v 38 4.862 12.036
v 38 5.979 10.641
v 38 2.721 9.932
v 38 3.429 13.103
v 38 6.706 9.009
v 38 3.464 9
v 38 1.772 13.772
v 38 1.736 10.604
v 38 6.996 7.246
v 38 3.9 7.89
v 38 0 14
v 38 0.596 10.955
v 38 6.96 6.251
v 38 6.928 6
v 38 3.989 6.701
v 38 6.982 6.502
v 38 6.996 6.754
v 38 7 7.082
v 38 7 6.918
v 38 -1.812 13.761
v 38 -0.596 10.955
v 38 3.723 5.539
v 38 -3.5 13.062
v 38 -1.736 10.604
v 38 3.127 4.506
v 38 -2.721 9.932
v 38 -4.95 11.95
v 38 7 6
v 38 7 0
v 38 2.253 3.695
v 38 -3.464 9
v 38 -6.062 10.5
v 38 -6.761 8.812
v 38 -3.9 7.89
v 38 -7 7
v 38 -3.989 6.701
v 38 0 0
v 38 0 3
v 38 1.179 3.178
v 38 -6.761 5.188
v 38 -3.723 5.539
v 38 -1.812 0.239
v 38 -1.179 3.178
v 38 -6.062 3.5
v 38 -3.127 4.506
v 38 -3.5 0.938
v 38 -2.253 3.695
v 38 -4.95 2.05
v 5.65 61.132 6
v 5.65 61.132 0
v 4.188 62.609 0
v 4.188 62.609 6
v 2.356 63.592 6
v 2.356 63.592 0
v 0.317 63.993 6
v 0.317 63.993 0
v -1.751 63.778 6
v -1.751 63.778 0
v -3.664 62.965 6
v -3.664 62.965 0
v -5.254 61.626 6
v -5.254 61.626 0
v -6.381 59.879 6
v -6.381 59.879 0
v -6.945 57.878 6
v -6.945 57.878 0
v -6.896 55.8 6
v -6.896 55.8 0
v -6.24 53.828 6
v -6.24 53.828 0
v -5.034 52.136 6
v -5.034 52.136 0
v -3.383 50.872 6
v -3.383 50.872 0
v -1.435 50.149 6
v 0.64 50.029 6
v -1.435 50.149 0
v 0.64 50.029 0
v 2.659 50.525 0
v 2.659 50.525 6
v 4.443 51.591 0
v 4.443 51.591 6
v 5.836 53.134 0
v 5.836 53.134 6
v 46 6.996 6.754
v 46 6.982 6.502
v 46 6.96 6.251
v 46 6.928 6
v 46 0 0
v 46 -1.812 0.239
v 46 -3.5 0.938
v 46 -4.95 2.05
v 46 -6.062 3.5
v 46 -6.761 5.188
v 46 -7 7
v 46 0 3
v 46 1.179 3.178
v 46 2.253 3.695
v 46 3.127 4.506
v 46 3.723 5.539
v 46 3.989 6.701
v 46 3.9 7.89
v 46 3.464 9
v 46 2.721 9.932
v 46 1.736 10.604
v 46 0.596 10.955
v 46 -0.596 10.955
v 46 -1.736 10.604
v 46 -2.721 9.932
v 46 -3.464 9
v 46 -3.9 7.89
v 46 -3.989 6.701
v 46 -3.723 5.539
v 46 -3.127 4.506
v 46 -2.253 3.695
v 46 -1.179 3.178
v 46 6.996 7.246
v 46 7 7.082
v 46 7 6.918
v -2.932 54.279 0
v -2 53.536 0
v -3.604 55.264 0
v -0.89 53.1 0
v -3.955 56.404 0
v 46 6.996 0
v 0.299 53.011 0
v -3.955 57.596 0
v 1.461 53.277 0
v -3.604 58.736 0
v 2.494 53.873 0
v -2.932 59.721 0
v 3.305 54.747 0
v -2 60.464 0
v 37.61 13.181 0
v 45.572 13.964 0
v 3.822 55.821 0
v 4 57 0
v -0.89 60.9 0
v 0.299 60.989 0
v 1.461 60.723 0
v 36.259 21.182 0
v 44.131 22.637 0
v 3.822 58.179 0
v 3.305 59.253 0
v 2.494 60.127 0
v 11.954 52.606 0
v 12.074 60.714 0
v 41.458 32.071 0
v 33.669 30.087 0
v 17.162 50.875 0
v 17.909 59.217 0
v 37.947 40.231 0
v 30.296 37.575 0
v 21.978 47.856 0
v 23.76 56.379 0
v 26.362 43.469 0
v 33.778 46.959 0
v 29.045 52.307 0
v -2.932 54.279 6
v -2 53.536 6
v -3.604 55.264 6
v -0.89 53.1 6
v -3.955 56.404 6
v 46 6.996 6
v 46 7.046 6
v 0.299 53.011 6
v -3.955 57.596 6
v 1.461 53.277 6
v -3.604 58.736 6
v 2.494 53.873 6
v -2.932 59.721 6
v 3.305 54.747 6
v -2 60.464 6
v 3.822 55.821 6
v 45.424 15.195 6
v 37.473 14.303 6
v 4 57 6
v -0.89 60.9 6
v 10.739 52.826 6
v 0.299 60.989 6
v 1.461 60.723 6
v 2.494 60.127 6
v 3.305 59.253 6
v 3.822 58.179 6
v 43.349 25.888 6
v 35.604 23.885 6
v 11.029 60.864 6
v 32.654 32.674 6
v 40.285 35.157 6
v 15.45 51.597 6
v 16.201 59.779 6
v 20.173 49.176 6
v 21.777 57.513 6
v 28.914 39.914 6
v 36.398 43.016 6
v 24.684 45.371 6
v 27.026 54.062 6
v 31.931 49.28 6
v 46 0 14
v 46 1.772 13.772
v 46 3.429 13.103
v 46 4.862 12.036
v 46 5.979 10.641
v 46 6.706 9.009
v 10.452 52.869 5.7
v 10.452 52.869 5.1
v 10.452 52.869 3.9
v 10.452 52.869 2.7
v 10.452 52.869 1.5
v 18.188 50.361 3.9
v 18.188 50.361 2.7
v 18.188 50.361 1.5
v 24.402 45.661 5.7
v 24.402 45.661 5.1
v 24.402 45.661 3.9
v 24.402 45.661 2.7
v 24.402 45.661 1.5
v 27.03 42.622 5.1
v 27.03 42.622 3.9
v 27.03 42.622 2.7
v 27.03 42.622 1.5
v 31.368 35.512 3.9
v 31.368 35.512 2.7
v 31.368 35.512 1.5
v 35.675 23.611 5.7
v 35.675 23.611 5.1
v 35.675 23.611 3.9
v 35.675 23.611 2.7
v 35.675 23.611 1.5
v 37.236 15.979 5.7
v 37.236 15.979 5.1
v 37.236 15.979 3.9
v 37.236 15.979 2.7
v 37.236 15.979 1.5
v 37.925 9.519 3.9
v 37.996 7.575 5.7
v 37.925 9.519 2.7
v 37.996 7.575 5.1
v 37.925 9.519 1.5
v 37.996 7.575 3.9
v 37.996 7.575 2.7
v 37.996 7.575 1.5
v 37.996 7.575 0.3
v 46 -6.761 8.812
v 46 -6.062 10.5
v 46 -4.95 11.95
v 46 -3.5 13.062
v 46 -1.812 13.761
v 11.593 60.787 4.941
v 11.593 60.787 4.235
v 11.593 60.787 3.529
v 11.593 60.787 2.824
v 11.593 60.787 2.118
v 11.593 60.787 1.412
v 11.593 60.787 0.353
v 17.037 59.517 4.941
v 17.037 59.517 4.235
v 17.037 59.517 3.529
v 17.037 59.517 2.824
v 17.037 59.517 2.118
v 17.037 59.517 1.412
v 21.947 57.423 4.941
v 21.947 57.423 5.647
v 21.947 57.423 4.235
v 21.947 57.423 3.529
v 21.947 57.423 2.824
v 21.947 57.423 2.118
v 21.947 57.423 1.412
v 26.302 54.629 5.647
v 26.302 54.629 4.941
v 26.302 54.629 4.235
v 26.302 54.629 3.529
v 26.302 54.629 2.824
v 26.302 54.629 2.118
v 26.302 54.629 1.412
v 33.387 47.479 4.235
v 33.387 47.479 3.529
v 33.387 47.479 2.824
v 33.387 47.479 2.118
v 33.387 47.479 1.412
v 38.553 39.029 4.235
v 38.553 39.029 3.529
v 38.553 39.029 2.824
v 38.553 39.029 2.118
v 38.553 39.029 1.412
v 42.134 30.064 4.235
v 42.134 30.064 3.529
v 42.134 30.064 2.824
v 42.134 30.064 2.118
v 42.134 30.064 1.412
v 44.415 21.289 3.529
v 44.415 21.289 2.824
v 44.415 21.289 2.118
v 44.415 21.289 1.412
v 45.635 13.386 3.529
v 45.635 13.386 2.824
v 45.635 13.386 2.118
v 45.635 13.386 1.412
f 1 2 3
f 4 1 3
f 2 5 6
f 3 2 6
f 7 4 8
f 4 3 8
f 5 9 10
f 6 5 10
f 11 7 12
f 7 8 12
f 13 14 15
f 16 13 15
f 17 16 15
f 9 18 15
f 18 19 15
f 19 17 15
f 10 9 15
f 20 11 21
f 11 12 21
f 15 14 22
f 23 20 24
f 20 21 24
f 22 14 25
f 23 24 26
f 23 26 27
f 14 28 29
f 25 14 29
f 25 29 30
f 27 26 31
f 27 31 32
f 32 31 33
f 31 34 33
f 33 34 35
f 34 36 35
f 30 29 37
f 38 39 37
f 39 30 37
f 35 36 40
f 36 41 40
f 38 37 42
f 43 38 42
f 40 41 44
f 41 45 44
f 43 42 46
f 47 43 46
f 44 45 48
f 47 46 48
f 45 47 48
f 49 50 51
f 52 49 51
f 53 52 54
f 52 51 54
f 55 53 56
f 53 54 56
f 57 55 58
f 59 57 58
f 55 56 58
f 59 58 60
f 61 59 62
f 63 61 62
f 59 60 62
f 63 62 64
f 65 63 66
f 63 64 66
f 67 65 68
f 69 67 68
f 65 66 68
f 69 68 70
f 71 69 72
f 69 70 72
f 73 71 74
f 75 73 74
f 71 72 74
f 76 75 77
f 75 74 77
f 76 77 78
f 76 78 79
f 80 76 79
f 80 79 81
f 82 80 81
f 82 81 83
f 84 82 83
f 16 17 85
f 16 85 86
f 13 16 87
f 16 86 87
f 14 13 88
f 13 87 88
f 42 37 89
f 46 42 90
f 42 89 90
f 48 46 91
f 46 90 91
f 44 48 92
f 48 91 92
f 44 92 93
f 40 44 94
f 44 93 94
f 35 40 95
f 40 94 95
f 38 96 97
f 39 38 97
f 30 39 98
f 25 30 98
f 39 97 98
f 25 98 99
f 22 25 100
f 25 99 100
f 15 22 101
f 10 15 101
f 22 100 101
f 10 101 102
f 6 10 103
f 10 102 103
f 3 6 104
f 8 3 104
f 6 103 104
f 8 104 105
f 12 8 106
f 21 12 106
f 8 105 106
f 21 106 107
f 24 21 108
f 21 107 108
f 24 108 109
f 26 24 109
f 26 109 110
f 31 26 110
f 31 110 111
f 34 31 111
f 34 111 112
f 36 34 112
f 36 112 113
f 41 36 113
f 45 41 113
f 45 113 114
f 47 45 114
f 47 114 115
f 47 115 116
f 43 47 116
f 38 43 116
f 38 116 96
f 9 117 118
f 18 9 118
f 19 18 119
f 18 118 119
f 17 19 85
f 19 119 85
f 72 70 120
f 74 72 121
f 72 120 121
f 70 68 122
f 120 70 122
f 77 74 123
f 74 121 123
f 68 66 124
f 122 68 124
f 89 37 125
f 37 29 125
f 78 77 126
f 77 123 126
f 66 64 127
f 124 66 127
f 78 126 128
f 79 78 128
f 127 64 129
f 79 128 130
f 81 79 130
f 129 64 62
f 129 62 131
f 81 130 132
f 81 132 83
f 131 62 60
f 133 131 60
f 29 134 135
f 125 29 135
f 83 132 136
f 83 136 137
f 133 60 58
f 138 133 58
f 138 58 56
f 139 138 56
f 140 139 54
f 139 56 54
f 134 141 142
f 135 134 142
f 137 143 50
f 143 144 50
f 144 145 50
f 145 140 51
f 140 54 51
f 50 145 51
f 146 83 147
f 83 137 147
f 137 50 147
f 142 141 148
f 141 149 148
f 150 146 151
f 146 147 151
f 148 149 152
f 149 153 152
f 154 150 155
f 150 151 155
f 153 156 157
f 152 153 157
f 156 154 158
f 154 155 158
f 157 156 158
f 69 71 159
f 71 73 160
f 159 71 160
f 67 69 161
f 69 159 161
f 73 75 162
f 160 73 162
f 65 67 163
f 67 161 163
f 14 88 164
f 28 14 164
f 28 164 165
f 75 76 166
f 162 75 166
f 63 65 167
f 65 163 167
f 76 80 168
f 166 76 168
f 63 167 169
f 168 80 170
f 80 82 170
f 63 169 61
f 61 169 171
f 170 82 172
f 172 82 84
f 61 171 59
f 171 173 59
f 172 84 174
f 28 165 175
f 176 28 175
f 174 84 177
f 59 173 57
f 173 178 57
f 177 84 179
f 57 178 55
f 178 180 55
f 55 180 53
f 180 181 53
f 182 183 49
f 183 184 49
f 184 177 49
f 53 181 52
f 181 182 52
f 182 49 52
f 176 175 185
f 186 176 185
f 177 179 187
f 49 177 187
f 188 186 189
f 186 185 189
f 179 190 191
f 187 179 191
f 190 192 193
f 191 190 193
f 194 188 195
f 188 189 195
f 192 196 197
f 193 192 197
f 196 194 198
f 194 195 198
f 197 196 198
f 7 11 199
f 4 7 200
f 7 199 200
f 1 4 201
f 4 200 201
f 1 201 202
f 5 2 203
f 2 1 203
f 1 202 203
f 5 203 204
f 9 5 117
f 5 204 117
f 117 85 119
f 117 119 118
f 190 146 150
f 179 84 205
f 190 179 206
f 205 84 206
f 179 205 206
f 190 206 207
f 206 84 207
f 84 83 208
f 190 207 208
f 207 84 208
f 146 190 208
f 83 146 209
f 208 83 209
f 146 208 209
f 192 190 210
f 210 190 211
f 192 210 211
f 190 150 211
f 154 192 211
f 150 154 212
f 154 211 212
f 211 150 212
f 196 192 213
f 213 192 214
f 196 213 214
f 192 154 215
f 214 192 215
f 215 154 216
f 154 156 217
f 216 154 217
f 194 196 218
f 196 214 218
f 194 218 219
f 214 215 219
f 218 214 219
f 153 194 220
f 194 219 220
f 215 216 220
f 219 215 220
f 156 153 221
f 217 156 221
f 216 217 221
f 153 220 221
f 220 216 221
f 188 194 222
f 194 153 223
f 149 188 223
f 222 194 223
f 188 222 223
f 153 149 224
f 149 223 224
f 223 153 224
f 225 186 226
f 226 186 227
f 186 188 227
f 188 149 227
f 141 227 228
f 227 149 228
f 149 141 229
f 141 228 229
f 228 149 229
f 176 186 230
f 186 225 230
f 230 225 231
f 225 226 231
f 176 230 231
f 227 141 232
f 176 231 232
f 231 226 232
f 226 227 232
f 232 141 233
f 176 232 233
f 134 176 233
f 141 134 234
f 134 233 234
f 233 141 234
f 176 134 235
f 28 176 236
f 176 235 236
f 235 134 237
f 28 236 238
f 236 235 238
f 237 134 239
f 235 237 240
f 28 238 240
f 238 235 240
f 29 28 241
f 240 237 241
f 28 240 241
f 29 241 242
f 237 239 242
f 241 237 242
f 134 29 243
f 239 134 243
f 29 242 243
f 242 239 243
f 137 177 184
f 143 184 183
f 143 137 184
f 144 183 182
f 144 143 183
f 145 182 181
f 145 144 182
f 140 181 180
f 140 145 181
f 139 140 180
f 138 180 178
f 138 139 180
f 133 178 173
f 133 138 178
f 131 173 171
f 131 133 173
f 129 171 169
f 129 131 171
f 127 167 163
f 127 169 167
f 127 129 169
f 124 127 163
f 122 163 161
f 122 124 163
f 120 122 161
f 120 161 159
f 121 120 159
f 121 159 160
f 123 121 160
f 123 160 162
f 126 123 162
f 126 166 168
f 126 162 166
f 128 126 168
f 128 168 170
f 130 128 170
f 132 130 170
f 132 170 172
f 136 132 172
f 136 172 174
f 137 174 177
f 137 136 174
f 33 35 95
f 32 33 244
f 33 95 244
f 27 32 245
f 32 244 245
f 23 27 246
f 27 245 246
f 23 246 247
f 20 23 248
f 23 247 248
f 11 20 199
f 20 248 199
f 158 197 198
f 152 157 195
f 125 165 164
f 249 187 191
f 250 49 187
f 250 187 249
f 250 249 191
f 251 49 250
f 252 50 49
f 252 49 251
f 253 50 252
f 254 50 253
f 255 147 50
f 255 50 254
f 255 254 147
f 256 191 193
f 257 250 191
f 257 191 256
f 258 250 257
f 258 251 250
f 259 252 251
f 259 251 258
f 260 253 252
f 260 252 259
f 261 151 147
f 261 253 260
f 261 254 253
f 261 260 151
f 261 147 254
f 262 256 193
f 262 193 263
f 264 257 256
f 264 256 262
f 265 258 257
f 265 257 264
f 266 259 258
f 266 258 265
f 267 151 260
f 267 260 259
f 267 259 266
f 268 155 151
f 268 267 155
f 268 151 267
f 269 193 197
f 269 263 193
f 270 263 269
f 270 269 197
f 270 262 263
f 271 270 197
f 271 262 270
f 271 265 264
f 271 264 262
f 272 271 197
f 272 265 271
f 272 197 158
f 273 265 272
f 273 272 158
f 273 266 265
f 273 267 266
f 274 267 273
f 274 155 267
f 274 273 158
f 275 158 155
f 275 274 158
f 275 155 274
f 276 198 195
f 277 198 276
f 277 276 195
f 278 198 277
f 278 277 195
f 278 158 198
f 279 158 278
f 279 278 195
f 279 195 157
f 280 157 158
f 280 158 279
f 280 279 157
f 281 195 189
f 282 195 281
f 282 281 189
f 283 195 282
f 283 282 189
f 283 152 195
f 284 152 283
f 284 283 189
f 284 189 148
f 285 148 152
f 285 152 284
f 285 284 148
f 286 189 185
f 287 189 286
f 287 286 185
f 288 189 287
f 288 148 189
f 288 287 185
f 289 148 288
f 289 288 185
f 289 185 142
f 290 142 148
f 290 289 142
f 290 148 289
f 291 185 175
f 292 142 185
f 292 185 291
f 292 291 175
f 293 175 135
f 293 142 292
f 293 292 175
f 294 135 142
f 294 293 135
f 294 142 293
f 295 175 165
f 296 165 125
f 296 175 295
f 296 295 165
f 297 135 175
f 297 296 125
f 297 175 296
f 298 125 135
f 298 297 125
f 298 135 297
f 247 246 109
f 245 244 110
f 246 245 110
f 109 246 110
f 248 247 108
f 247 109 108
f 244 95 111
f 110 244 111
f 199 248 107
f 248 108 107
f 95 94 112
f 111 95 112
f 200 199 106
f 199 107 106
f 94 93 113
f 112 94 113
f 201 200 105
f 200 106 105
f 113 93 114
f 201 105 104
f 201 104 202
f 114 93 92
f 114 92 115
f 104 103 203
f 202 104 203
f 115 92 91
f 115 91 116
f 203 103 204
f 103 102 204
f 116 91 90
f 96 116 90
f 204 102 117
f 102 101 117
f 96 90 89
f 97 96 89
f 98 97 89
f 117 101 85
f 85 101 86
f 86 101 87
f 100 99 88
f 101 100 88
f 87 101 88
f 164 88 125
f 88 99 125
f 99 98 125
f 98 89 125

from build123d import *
from OCP.BRepAlgoAPI import BRepAlgoAPI_Cut
from OCP.TopTools import TopTools_ListOfShape

# Parameters (mm, degrees)
ESBO_O1_R                = 4
RESSALTO_EXTRUS_O1_DEPTH = 14
ESBO_O2_R                = 4
CORTE_EXTRUS_O1_DEPTH    = 85.267431587


with BuildPart() as part:
    # Esboço1 → Ressalto-extrusão1 (new body)
    with BuildSketch(Plane.XY):
        with BuildLine():
            Line((46, -7), (46, 6.995688759))
            add(Edge.make_bspline(
                [(5.650259544, 61.132138319), (6.660650147, 61.155575151), (8.710848107, 61.120789853), (12.578892548, 60.727605083), (17.127930578, 59.655790613), (22.040205616, 57.539349047), (26.394344624, 54.722364625), (30.19261077, 51.343572081), (34.558581899, 46.260896731), (38.815468688, 39.112541001), (41.760696394, 31.545459809), (43.470535674, 25.587286464), (44.459557745, 21.252306014), (45.183880004, 17.135758602), (45.589217997, 13.957943213), (45.8071763, 11.605329402), (45.920450747, 9.949575993), (45.986308659, 8.391657602), (46.000256085, 7.470883976), (46, 6.995688759)],
                knots=[0, 0, 0, 0, 0.03125, 0.0625, 0.125, 0.1875, 0.25, 0.3125, 0.375, 0.5, 0.625, 0.6875, 0.75, 0.8125, 0.875, 0.90625, 0.9375, 0.96875, 1, 1, 1, 1], degree=3))
            ThreePointArc((5.650259544, 61.132138319), (-6.998117599, 56.837672963), (5.835776158, 53.134289634))
            add(Edge.make_bspline(
                [(5.835776158, 53.134289634), (6.238188643, 53.143623919), (7.052270041, 53.146185942), (8.608930463, 53.086843267), (10.474039614, 52.897553491), (12.577068171, 52.49932445), (15.220765339, 51.755589596), (18.249448664, 50.451415), (21.515264324, 48.342822315), (24.453790354, 45.735335437), (27.957095233, 41.667286815), (31.567422767, 35.644835437), (34.179252288, 28.956801958), (35.718249768, 23.595597215), (36.614783762, 19.667281612), (37.272272941, 15.930397286), (37.638098577, 13.059067768), (37.83252613, 10.960084825), (37.932188748, 9.497611194), (37.979377076, 8.387903873), (37.997359238, 7.565341164), (38.000104404, 7.191578727), (38.000001162, 7)],
                knots=[0, 0, 0, 0, 0.015625, 0.03125, 0.0625, 0.09375, 0.125, 0.1875, 0.25, 0.3125, 0.375, 0.5, 0.625, 0.6875, 0.75, 0.8125, 0.875, 0.90625, 0.9375, 0.96875, 0.984375, 1, 1, 1, 1], degree=3))
            Line((38.000001162, 7), (38.000001162, -7))
            Line((38.000001162, -7), (46, -7))
        make_face()
        with Locations((0, 57)):
            Circle(ESBO_O1_R, mode=Mode.SUBTRACT)
    extrude(amount=RESSALTO_EXTRUS_O1_DEPTH)


with BuildPart() as corte_extrus_o1_tool:
    # Esboço2 → Corte-extrusão1 (new, through all)
    with BuildSketch(Plane(origin=(46, 0, 0), x_dir=(0, 0, -1), z_dir=(1, 0, 0))):
        with BuildLine():
            ThreePointArc((-7, -7), (-11.949747468, -4.949747468), (-14, 0))
            Line((-14, 0), (-14, -7))
            Line((-14, -7), (-7, -7))
        make_face()
        with BuildLine():
            Line((-7.245639543, 6.995688759), (-14, 6.995688759))
            Line((-14, 6.995688759), (-14, 0))
            ThreePointArc((-14, 0), (-12.035845351, 4.862125214), (-7.245639543, 6.995688759))
        make_face()
        with Locations((-7, 0)):
            Circle(ESBO_O2_R)
        with BuildLine():
            Line((0, -7), (0, 0))
            ThreePointArc((0, 0), (-2.050252532, -4.949747468), (-7, -7))
            Line((-7, -7), (0, -7))
        make_face()
        with BuildLine():
            Line((-6, 6.92820323), (-6, 6.995688759))
            Line((-6, 6.995688759), (-6.754360457, 6.995688759))
            ThreePointArc((-6.754360457, 6.995688759), (-6.37626685, 6.972155833), (-6, 6.92820323))
        make_face()
        with BuildLine():
            Line((-6, 6.995688759), (-6, 64))
            Line((-6, 64), (-14, 64))
            Line((-14, 64), (-14, 6.995688759))
            Line((-14, 6.995688759), (-7.245639543, 6.995688759))
            ThreePointArc((-7.245639543, 6.995688759), (-7, 7), (-6.754360457, 6.995688759))
            Line((-6.754360457, 6.995688759), (-6, 6.995688759))
        make_face()
    extrude(amount=-CORTE_EXTRUS_O1_DEPTH)


with BuildPart() as part_1:
    add(part.part)

    # Corte-extrusão1: cut by corte_extrus_o1_tool, with a tolerance
    corte_extrus_o1_stock = TopTools_ListOfShape()
    corte_extrus_o1_stock.Append(part_1.part.wrapped)
    corte_extrus_o1_tools = TopTools_ListOfShape()
    corte_extrus_o1_tools.Append(corte_extrus_o1_tool.part.wrapped)
    corte_extrus_o1_cut = BRepAlgoAPI_Cut()
    corte_extrus_o1_cut.SetArguments(corte_extrus_o1_stock)
    corte_extrus_o1_cut.SetTools(corte_extrus_o1_tools)
    corte_extrus_o1_cut.SetFuzzyValue(0.00001)
    corte_extrus_o1_cut.Build()
    add(Compound.cast(corte_extrus_o1_cut.Shape()).solids(), mode=Mode.REPLACE)


with BuildPart() as corte_extrus_o1_kept_piece:
    # of the separate pieces the step leaves, the one the design keeps (corte_extrus_o1_pieces_kept)
    add(part_1.part.solids().sort_by_distance((46, 0, 0))[0])


solid = corte_extrus_o1_kept_piece.part
